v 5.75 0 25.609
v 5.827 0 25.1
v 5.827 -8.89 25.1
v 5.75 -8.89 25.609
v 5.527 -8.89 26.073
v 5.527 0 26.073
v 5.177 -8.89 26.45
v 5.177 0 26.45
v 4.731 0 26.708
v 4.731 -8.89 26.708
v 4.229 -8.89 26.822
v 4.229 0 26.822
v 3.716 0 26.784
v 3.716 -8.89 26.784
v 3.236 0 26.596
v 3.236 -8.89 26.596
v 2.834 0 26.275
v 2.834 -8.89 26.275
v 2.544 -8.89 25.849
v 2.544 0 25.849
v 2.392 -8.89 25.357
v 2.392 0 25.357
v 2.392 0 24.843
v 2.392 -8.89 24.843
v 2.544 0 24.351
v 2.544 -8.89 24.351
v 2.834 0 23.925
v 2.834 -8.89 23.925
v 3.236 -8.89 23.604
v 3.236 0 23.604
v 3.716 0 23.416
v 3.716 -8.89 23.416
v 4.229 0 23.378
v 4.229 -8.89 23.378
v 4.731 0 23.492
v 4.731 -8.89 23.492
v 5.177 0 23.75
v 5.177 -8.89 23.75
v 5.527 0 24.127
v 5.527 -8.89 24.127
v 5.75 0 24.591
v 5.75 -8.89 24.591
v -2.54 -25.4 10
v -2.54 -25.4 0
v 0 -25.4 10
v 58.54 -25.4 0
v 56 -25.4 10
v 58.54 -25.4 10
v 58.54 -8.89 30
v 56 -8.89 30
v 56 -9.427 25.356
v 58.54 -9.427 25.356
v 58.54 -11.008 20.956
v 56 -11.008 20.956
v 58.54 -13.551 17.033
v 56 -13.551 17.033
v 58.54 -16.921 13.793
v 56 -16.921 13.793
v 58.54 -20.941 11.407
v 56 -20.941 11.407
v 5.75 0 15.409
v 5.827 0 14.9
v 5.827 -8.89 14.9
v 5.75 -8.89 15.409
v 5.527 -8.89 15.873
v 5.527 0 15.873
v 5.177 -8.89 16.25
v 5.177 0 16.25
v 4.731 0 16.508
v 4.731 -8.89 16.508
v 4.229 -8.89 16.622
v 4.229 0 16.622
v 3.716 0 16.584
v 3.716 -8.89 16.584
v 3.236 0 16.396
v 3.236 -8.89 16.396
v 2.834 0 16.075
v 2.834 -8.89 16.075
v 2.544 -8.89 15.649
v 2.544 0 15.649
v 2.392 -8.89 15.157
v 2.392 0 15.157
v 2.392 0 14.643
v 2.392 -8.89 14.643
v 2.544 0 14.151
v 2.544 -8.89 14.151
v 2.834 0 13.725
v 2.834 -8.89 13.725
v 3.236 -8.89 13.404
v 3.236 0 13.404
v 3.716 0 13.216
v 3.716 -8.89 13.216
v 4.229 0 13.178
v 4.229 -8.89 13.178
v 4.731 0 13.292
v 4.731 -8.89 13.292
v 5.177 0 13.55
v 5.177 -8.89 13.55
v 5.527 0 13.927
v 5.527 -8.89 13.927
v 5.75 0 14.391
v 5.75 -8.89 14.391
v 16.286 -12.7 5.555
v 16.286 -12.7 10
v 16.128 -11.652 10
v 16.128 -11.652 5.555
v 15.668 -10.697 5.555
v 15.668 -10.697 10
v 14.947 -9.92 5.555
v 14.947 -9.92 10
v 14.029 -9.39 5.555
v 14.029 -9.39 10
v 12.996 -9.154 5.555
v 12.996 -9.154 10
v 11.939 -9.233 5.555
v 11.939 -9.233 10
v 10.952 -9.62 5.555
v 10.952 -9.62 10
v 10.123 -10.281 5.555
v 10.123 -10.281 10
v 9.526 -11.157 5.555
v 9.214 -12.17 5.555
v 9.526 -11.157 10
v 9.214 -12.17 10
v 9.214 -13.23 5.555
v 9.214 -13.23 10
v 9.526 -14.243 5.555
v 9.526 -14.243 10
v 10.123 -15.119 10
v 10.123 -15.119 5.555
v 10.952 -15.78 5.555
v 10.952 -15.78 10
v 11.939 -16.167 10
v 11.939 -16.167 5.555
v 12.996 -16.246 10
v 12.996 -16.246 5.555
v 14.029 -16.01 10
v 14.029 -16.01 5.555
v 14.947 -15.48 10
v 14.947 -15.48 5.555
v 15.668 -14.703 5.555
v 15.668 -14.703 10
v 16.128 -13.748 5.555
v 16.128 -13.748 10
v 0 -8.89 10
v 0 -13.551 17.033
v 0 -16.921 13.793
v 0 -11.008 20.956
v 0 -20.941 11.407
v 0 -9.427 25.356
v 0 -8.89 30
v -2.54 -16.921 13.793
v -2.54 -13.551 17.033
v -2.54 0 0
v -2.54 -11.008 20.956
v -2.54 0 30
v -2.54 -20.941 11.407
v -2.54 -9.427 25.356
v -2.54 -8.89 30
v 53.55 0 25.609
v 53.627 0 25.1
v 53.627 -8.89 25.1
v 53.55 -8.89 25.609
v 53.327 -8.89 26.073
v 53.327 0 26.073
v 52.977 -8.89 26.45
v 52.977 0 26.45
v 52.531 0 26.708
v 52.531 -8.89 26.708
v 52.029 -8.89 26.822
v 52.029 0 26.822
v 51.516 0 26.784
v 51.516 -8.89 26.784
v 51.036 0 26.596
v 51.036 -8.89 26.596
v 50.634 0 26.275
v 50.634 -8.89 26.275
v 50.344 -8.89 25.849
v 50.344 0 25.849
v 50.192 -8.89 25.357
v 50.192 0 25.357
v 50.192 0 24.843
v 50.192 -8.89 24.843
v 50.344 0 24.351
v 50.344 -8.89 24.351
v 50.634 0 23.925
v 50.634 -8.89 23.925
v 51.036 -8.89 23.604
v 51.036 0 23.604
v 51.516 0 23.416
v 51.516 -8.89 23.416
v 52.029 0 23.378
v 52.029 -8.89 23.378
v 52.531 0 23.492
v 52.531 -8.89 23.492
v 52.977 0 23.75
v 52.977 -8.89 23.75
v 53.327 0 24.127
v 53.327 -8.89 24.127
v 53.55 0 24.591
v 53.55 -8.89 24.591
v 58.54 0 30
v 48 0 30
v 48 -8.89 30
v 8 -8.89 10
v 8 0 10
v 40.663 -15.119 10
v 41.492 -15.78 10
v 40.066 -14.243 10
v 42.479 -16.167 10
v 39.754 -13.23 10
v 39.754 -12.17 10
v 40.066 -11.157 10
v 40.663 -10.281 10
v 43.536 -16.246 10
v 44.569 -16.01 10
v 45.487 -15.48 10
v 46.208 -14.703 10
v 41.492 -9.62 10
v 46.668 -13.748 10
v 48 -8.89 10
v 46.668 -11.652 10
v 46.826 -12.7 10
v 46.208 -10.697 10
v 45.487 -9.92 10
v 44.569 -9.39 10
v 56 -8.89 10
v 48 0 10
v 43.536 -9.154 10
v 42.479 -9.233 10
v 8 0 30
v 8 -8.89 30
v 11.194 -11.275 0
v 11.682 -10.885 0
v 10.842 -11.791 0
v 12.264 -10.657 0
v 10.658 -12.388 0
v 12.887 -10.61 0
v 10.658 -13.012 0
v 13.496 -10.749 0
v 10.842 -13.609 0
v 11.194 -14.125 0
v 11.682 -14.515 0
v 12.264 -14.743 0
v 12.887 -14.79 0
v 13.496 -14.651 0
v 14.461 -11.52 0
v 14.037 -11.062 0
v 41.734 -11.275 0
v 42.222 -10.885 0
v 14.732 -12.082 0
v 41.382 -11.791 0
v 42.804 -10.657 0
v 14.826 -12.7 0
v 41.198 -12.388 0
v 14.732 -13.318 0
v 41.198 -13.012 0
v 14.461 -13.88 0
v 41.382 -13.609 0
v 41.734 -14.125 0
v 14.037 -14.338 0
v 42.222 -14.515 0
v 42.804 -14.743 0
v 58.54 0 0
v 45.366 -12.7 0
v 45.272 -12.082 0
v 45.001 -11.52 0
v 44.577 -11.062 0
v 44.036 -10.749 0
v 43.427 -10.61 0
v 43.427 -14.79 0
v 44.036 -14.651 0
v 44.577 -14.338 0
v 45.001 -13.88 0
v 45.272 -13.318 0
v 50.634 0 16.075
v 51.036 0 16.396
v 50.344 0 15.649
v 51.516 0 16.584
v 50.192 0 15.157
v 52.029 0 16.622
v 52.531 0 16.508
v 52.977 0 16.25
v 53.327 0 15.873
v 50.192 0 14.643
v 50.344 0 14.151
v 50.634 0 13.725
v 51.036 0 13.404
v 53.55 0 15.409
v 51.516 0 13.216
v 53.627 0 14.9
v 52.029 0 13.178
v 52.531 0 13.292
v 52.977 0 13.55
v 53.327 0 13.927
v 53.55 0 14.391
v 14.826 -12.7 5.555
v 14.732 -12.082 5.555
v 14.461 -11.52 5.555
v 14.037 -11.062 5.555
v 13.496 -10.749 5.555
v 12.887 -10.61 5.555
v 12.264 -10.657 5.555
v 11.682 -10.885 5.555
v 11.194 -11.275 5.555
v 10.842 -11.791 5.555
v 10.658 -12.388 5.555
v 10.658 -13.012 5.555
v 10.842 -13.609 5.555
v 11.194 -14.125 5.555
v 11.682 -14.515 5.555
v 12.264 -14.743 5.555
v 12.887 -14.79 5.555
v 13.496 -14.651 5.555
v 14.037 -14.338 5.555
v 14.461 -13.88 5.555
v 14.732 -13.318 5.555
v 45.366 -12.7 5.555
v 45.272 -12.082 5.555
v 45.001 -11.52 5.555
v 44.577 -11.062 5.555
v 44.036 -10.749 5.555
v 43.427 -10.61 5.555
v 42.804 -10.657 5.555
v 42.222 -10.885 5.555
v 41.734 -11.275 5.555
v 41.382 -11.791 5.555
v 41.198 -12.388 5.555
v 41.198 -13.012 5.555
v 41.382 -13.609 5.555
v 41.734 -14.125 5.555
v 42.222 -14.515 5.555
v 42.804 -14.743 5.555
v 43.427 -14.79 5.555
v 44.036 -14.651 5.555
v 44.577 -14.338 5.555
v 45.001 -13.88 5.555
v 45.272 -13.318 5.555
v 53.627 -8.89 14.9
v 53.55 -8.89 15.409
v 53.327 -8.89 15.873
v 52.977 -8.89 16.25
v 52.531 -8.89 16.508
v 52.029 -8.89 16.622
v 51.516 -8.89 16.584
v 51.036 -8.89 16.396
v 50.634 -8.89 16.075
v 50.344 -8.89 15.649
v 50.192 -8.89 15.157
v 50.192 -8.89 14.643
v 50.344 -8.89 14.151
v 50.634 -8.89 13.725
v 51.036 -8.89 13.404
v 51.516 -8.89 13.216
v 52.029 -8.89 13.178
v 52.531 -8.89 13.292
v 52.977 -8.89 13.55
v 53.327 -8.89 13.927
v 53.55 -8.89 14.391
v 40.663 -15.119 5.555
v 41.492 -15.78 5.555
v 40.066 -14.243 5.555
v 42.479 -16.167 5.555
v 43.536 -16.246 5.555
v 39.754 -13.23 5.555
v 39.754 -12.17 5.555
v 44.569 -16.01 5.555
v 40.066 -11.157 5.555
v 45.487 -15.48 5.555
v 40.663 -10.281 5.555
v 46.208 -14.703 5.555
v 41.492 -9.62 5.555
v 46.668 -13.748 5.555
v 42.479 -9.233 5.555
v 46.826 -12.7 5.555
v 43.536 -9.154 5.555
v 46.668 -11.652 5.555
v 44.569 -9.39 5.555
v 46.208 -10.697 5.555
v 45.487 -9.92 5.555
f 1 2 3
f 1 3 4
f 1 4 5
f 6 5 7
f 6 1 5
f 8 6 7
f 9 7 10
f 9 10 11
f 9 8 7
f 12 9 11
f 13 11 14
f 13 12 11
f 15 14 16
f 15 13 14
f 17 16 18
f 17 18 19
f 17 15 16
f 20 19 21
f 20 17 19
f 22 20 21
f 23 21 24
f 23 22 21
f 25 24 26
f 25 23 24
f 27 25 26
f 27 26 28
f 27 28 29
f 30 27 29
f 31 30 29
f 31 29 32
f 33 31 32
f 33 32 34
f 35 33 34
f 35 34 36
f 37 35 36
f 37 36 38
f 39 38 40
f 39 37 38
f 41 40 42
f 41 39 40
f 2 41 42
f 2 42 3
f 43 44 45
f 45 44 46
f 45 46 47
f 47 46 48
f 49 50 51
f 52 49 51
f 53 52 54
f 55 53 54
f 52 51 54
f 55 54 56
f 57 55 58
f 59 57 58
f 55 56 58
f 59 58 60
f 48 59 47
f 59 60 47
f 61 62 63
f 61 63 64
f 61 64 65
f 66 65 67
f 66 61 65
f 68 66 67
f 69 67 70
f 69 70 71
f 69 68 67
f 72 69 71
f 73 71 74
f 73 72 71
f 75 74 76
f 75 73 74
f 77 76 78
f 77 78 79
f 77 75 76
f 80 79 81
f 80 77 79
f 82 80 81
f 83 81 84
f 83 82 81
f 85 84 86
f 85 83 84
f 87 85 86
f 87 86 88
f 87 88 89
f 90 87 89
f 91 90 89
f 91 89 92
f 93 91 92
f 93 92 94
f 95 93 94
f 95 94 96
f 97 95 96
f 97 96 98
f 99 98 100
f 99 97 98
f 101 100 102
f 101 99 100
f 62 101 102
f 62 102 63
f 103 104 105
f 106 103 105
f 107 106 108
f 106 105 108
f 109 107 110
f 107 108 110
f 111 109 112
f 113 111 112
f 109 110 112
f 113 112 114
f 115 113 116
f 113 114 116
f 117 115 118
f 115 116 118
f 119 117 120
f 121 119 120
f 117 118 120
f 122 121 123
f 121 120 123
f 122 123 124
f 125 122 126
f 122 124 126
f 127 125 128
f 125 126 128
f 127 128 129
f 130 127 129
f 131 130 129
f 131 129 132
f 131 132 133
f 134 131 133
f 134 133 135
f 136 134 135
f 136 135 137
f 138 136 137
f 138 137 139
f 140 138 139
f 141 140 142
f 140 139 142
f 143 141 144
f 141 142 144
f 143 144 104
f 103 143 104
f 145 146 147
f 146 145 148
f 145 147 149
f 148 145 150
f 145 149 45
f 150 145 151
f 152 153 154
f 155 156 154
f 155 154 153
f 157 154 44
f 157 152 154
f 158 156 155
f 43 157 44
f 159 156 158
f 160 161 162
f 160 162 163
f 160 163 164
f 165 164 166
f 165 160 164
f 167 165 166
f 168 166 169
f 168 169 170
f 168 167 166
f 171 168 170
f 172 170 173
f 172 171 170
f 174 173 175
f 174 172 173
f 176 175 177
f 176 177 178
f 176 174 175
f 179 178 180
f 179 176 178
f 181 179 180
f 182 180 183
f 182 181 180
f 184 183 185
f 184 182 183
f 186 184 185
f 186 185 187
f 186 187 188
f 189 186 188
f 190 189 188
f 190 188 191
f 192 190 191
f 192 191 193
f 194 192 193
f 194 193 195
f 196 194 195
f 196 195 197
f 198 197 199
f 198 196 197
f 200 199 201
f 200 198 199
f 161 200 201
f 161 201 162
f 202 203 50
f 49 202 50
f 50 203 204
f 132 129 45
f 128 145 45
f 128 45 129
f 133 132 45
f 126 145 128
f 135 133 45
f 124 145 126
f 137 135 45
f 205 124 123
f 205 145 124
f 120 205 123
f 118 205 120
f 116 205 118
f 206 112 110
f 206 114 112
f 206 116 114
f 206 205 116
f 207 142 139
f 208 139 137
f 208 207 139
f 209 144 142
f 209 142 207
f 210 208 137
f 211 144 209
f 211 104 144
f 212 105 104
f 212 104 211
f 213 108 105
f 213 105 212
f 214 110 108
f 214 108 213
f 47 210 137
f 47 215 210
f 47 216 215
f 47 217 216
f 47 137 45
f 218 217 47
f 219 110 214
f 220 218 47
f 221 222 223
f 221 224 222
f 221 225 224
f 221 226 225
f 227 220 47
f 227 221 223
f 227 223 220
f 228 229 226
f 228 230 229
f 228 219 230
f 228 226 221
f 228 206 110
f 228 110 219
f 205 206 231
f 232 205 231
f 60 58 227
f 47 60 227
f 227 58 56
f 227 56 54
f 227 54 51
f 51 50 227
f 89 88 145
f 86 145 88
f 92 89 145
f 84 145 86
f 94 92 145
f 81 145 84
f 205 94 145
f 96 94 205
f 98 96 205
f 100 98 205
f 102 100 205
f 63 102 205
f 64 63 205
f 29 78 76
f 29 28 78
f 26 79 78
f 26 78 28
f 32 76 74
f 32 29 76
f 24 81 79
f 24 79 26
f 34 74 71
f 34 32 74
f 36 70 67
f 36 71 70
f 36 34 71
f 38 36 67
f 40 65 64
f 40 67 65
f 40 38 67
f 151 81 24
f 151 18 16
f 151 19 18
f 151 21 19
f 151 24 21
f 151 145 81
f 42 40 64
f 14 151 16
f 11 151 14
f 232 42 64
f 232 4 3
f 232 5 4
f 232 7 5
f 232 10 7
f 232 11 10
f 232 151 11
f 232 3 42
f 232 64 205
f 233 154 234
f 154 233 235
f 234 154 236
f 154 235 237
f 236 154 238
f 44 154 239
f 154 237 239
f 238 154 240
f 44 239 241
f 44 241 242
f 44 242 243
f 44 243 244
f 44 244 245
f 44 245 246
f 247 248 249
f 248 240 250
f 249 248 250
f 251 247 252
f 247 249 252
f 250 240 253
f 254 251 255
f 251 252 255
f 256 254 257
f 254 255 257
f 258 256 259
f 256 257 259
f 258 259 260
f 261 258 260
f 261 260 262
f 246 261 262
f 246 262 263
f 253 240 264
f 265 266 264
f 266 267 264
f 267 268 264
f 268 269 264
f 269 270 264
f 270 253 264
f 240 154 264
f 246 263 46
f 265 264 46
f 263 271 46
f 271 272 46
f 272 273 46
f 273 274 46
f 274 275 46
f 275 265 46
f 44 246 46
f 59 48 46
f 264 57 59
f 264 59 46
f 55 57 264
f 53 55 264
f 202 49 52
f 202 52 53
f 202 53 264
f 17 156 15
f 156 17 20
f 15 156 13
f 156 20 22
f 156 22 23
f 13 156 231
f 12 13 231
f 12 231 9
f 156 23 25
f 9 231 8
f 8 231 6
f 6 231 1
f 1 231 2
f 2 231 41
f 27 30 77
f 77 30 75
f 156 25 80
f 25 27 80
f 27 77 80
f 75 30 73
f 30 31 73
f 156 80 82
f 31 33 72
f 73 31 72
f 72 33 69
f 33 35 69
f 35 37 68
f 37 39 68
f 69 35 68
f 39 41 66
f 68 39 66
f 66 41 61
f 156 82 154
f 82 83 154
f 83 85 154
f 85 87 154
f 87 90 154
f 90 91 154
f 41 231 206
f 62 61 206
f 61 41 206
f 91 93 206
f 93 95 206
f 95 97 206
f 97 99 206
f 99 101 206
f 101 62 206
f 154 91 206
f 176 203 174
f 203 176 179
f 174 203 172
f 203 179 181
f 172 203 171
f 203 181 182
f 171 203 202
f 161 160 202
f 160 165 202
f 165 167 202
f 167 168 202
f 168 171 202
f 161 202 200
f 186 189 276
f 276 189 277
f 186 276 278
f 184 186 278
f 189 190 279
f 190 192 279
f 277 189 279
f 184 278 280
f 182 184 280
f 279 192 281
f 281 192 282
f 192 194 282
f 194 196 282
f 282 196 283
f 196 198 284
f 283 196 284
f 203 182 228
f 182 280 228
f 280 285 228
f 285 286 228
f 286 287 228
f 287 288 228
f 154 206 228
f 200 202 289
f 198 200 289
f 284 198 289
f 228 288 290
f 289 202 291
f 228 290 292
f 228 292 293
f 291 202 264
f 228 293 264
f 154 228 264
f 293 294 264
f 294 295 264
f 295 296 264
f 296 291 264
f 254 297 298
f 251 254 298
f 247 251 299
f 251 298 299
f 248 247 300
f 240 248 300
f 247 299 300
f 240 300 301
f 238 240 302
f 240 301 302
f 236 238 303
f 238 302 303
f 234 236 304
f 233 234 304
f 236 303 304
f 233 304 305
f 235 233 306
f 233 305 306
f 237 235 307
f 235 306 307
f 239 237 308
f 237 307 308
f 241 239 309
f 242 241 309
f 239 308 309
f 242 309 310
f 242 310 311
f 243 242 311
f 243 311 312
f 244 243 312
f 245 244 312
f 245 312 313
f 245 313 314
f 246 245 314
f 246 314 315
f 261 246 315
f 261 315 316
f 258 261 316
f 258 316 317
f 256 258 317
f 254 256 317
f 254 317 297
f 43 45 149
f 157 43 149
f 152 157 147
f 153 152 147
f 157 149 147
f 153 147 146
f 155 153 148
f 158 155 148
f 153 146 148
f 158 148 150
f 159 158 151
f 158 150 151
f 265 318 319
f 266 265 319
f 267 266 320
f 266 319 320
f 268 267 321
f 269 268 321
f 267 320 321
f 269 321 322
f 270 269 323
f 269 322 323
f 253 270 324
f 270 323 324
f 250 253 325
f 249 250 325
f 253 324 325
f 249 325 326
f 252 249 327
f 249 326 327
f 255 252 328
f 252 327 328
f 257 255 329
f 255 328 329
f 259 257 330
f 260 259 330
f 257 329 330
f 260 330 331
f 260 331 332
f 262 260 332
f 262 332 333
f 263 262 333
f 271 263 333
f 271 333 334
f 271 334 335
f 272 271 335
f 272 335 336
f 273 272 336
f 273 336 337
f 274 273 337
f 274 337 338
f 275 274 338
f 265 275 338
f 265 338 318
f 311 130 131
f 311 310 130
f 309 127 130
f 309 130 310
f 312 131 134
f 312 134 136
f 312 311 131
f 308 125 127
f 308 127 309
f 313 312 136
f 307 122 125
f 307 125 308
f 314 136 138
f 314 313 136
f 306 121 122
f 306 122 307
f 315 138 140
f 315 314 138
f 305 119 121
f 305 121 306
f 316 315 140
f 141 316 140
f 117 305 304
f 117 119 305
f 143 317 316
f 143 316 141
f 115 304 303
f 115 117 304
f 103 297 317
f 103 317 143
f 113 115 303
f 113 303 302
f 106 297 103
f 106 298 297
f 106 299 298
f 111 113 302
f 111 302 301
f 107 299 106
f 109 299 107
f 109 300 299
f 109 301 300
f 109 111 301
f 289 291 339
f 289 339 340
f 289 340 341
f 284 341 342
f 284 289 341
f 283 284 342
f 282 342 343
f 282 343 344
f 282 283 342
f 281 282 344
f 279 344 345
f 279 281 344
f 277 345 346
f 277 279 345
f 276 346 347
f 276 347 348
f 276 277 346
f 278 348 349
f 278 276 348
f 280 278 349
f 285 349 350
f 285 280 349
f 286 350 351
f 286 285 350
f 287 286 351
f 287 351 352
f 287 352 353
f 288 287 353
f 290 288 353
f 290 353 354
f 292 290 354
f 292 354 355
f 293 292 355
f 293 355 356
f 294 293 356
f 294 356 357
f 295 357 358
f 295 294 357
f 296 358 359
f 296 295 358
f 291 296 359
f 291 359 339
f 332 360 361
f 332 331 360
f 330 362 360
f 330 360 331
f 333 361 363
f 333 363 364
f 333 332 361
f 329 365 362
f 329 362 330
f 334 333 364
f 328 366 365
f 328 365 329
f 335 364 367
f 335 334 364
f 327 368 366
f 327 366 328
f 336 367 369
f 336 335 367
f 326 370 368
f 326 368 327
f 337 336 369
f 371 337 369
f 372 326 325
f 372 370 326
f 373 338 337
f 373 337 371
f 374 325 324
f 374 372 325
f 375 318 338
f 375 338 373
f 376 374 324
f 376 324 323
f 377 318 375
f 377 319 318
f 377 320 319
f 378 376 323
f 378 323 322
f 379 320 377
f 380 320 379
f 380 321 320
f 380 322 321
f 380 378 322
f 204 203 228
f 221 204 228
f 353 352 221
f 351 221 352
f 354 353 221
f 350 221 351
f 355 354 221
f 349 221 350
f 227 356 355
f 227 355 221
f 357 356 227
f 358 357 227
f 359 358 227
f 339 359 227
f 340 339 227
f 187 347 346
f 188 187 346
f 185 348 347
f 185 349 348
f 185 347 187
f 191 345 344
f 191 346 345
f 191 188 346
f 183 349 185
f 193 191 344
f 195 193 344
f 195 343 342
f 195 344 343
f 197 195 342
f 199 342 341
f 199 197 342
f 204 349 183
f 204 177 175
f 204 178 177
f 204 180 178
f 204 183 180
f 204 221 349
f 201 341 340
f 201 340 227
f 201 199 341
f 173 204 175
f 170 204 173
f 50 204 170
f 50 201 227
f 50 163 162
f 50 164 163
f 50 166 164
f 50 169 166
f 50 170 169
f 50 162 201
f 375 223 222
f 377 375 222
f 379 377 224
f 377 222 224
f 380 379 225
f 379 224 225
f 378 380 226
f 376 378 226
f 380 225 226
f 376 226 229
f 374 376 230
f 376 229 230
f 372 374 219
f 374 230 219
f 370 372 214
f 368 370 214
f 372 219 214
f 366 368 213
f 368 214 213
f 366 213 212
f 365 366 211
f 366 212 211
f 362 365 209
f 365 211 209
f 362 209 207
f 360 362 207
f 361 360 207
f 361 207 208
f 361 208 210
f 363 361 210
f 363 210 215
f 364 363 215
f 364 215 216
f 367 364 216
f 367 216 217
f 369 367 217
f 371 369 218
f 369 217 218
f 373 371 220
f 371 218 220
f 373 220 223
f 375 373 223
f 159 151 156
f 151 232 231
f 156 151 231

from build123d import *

# Parameters (mm, degrees)
F0_R      = 1.7272
F1_DEPTH  = 8.89
F2_W      = 56
F2_H      = 10
F3_DEPTH  = 16.51
F5_DEPTH  = 2.54
F7_DEPTH  = 2.54
F8_R      = 2.0955
F9_DEPTH  = 10.001
F10_R     = 3.556
F11_DEPTH = 4.445


with BuildPart() as f1:
    # F0 (on Front) → F1 (new body)
    with BuildSketch(Plane.XZ):
        Polygon((0, 30), (0, 0), (56, 0), (56, 30), (48, 30), (48, 10), (8, 10), (8, 30), align=None)
        with Locations((4.1, 14.9)):
            Circle(F0_R, mode=Mode.SUBTRACT)
        with Locations((51.9, 14.9)):
            Circle(F0_R, mode=Mode.SUBTRACT)
        with Locations((4.1, 25.1)):
            Circle(F0_R, mode=Mode.SUBTRACT)
        with Locations((51.9, 25.1)):
            Circle(F0_R, mode=Mode.SUBTRACT)
    extrude(amount=F1_DEPTH)

    # F2 (on face) → F3 (join)
    with BuildSketch(Plane.XZ.offset(8.89)):
        with Locations((28, 5)):
            Rectangle(F2_W, F2_H)
    extrude(amount=F3_DEPTH)

    # F4 (on face) → F5 (join)
    with BuildSketch(Plane.YZ.offset(56)):
        with BuildLine():
            Line((0, 30), (-8.89, 30))
            ThreePointArc((-8.89, 30), (-13.550724, 17.032925), (-25.4, 10))
            Line((-25.4, 10), (-25.4, 0))
            Line((-25.4, 0), (0, 0))
            Line((0, 0), (0, 30))
        make_face()
    extrude(amount=F5_DEPTH)

    # F6 (on face) → F7 (join)
    with BuildSketch(Plane(origin=(0, 0, 0), x_dir=(0, -1, 0), z_dir=(-1, 0, 0))):
        Polygon((8.89, 10), (8.89, 30), (0, 30), (0, 0), (25.4, 0), (25.4, 10), align=None)
        with BuildLine():
            ThreePointArc((25.4, 10), (13.550724, 17.032925), (8.89, 30))
            Line((8.89, 30), (8.89, 10))
            Line((8.89, 10), (25.4, 10))
        make_face()
    extrude(amount=F7_DEPTH)

    # F8 (on face) → F9 (cut, through all)
    with BuildSketch(Plane.XY.offset(10)):
        with Locations((12.73, -12.7)):
            Circle(F8_R)
        with Locations((43.27, -12.7)):
            Circle(F8_R)
    extrude(amount=-F9_DEPTH, mode=Mode.SUBTRACT)

    # F10 (on face) → F11 (cut)
    with BuildSketch(Plane.XY.offset(10)):
        with Locations((12.73, -12.7)):
            Circle(F10_R)
        with Locations((43.27, -12.7)):
            Circle(F10_R)
    extrude(amount=-F11_DEPTH, mode=Mode.SUBTRACT)


solid = f1.part
